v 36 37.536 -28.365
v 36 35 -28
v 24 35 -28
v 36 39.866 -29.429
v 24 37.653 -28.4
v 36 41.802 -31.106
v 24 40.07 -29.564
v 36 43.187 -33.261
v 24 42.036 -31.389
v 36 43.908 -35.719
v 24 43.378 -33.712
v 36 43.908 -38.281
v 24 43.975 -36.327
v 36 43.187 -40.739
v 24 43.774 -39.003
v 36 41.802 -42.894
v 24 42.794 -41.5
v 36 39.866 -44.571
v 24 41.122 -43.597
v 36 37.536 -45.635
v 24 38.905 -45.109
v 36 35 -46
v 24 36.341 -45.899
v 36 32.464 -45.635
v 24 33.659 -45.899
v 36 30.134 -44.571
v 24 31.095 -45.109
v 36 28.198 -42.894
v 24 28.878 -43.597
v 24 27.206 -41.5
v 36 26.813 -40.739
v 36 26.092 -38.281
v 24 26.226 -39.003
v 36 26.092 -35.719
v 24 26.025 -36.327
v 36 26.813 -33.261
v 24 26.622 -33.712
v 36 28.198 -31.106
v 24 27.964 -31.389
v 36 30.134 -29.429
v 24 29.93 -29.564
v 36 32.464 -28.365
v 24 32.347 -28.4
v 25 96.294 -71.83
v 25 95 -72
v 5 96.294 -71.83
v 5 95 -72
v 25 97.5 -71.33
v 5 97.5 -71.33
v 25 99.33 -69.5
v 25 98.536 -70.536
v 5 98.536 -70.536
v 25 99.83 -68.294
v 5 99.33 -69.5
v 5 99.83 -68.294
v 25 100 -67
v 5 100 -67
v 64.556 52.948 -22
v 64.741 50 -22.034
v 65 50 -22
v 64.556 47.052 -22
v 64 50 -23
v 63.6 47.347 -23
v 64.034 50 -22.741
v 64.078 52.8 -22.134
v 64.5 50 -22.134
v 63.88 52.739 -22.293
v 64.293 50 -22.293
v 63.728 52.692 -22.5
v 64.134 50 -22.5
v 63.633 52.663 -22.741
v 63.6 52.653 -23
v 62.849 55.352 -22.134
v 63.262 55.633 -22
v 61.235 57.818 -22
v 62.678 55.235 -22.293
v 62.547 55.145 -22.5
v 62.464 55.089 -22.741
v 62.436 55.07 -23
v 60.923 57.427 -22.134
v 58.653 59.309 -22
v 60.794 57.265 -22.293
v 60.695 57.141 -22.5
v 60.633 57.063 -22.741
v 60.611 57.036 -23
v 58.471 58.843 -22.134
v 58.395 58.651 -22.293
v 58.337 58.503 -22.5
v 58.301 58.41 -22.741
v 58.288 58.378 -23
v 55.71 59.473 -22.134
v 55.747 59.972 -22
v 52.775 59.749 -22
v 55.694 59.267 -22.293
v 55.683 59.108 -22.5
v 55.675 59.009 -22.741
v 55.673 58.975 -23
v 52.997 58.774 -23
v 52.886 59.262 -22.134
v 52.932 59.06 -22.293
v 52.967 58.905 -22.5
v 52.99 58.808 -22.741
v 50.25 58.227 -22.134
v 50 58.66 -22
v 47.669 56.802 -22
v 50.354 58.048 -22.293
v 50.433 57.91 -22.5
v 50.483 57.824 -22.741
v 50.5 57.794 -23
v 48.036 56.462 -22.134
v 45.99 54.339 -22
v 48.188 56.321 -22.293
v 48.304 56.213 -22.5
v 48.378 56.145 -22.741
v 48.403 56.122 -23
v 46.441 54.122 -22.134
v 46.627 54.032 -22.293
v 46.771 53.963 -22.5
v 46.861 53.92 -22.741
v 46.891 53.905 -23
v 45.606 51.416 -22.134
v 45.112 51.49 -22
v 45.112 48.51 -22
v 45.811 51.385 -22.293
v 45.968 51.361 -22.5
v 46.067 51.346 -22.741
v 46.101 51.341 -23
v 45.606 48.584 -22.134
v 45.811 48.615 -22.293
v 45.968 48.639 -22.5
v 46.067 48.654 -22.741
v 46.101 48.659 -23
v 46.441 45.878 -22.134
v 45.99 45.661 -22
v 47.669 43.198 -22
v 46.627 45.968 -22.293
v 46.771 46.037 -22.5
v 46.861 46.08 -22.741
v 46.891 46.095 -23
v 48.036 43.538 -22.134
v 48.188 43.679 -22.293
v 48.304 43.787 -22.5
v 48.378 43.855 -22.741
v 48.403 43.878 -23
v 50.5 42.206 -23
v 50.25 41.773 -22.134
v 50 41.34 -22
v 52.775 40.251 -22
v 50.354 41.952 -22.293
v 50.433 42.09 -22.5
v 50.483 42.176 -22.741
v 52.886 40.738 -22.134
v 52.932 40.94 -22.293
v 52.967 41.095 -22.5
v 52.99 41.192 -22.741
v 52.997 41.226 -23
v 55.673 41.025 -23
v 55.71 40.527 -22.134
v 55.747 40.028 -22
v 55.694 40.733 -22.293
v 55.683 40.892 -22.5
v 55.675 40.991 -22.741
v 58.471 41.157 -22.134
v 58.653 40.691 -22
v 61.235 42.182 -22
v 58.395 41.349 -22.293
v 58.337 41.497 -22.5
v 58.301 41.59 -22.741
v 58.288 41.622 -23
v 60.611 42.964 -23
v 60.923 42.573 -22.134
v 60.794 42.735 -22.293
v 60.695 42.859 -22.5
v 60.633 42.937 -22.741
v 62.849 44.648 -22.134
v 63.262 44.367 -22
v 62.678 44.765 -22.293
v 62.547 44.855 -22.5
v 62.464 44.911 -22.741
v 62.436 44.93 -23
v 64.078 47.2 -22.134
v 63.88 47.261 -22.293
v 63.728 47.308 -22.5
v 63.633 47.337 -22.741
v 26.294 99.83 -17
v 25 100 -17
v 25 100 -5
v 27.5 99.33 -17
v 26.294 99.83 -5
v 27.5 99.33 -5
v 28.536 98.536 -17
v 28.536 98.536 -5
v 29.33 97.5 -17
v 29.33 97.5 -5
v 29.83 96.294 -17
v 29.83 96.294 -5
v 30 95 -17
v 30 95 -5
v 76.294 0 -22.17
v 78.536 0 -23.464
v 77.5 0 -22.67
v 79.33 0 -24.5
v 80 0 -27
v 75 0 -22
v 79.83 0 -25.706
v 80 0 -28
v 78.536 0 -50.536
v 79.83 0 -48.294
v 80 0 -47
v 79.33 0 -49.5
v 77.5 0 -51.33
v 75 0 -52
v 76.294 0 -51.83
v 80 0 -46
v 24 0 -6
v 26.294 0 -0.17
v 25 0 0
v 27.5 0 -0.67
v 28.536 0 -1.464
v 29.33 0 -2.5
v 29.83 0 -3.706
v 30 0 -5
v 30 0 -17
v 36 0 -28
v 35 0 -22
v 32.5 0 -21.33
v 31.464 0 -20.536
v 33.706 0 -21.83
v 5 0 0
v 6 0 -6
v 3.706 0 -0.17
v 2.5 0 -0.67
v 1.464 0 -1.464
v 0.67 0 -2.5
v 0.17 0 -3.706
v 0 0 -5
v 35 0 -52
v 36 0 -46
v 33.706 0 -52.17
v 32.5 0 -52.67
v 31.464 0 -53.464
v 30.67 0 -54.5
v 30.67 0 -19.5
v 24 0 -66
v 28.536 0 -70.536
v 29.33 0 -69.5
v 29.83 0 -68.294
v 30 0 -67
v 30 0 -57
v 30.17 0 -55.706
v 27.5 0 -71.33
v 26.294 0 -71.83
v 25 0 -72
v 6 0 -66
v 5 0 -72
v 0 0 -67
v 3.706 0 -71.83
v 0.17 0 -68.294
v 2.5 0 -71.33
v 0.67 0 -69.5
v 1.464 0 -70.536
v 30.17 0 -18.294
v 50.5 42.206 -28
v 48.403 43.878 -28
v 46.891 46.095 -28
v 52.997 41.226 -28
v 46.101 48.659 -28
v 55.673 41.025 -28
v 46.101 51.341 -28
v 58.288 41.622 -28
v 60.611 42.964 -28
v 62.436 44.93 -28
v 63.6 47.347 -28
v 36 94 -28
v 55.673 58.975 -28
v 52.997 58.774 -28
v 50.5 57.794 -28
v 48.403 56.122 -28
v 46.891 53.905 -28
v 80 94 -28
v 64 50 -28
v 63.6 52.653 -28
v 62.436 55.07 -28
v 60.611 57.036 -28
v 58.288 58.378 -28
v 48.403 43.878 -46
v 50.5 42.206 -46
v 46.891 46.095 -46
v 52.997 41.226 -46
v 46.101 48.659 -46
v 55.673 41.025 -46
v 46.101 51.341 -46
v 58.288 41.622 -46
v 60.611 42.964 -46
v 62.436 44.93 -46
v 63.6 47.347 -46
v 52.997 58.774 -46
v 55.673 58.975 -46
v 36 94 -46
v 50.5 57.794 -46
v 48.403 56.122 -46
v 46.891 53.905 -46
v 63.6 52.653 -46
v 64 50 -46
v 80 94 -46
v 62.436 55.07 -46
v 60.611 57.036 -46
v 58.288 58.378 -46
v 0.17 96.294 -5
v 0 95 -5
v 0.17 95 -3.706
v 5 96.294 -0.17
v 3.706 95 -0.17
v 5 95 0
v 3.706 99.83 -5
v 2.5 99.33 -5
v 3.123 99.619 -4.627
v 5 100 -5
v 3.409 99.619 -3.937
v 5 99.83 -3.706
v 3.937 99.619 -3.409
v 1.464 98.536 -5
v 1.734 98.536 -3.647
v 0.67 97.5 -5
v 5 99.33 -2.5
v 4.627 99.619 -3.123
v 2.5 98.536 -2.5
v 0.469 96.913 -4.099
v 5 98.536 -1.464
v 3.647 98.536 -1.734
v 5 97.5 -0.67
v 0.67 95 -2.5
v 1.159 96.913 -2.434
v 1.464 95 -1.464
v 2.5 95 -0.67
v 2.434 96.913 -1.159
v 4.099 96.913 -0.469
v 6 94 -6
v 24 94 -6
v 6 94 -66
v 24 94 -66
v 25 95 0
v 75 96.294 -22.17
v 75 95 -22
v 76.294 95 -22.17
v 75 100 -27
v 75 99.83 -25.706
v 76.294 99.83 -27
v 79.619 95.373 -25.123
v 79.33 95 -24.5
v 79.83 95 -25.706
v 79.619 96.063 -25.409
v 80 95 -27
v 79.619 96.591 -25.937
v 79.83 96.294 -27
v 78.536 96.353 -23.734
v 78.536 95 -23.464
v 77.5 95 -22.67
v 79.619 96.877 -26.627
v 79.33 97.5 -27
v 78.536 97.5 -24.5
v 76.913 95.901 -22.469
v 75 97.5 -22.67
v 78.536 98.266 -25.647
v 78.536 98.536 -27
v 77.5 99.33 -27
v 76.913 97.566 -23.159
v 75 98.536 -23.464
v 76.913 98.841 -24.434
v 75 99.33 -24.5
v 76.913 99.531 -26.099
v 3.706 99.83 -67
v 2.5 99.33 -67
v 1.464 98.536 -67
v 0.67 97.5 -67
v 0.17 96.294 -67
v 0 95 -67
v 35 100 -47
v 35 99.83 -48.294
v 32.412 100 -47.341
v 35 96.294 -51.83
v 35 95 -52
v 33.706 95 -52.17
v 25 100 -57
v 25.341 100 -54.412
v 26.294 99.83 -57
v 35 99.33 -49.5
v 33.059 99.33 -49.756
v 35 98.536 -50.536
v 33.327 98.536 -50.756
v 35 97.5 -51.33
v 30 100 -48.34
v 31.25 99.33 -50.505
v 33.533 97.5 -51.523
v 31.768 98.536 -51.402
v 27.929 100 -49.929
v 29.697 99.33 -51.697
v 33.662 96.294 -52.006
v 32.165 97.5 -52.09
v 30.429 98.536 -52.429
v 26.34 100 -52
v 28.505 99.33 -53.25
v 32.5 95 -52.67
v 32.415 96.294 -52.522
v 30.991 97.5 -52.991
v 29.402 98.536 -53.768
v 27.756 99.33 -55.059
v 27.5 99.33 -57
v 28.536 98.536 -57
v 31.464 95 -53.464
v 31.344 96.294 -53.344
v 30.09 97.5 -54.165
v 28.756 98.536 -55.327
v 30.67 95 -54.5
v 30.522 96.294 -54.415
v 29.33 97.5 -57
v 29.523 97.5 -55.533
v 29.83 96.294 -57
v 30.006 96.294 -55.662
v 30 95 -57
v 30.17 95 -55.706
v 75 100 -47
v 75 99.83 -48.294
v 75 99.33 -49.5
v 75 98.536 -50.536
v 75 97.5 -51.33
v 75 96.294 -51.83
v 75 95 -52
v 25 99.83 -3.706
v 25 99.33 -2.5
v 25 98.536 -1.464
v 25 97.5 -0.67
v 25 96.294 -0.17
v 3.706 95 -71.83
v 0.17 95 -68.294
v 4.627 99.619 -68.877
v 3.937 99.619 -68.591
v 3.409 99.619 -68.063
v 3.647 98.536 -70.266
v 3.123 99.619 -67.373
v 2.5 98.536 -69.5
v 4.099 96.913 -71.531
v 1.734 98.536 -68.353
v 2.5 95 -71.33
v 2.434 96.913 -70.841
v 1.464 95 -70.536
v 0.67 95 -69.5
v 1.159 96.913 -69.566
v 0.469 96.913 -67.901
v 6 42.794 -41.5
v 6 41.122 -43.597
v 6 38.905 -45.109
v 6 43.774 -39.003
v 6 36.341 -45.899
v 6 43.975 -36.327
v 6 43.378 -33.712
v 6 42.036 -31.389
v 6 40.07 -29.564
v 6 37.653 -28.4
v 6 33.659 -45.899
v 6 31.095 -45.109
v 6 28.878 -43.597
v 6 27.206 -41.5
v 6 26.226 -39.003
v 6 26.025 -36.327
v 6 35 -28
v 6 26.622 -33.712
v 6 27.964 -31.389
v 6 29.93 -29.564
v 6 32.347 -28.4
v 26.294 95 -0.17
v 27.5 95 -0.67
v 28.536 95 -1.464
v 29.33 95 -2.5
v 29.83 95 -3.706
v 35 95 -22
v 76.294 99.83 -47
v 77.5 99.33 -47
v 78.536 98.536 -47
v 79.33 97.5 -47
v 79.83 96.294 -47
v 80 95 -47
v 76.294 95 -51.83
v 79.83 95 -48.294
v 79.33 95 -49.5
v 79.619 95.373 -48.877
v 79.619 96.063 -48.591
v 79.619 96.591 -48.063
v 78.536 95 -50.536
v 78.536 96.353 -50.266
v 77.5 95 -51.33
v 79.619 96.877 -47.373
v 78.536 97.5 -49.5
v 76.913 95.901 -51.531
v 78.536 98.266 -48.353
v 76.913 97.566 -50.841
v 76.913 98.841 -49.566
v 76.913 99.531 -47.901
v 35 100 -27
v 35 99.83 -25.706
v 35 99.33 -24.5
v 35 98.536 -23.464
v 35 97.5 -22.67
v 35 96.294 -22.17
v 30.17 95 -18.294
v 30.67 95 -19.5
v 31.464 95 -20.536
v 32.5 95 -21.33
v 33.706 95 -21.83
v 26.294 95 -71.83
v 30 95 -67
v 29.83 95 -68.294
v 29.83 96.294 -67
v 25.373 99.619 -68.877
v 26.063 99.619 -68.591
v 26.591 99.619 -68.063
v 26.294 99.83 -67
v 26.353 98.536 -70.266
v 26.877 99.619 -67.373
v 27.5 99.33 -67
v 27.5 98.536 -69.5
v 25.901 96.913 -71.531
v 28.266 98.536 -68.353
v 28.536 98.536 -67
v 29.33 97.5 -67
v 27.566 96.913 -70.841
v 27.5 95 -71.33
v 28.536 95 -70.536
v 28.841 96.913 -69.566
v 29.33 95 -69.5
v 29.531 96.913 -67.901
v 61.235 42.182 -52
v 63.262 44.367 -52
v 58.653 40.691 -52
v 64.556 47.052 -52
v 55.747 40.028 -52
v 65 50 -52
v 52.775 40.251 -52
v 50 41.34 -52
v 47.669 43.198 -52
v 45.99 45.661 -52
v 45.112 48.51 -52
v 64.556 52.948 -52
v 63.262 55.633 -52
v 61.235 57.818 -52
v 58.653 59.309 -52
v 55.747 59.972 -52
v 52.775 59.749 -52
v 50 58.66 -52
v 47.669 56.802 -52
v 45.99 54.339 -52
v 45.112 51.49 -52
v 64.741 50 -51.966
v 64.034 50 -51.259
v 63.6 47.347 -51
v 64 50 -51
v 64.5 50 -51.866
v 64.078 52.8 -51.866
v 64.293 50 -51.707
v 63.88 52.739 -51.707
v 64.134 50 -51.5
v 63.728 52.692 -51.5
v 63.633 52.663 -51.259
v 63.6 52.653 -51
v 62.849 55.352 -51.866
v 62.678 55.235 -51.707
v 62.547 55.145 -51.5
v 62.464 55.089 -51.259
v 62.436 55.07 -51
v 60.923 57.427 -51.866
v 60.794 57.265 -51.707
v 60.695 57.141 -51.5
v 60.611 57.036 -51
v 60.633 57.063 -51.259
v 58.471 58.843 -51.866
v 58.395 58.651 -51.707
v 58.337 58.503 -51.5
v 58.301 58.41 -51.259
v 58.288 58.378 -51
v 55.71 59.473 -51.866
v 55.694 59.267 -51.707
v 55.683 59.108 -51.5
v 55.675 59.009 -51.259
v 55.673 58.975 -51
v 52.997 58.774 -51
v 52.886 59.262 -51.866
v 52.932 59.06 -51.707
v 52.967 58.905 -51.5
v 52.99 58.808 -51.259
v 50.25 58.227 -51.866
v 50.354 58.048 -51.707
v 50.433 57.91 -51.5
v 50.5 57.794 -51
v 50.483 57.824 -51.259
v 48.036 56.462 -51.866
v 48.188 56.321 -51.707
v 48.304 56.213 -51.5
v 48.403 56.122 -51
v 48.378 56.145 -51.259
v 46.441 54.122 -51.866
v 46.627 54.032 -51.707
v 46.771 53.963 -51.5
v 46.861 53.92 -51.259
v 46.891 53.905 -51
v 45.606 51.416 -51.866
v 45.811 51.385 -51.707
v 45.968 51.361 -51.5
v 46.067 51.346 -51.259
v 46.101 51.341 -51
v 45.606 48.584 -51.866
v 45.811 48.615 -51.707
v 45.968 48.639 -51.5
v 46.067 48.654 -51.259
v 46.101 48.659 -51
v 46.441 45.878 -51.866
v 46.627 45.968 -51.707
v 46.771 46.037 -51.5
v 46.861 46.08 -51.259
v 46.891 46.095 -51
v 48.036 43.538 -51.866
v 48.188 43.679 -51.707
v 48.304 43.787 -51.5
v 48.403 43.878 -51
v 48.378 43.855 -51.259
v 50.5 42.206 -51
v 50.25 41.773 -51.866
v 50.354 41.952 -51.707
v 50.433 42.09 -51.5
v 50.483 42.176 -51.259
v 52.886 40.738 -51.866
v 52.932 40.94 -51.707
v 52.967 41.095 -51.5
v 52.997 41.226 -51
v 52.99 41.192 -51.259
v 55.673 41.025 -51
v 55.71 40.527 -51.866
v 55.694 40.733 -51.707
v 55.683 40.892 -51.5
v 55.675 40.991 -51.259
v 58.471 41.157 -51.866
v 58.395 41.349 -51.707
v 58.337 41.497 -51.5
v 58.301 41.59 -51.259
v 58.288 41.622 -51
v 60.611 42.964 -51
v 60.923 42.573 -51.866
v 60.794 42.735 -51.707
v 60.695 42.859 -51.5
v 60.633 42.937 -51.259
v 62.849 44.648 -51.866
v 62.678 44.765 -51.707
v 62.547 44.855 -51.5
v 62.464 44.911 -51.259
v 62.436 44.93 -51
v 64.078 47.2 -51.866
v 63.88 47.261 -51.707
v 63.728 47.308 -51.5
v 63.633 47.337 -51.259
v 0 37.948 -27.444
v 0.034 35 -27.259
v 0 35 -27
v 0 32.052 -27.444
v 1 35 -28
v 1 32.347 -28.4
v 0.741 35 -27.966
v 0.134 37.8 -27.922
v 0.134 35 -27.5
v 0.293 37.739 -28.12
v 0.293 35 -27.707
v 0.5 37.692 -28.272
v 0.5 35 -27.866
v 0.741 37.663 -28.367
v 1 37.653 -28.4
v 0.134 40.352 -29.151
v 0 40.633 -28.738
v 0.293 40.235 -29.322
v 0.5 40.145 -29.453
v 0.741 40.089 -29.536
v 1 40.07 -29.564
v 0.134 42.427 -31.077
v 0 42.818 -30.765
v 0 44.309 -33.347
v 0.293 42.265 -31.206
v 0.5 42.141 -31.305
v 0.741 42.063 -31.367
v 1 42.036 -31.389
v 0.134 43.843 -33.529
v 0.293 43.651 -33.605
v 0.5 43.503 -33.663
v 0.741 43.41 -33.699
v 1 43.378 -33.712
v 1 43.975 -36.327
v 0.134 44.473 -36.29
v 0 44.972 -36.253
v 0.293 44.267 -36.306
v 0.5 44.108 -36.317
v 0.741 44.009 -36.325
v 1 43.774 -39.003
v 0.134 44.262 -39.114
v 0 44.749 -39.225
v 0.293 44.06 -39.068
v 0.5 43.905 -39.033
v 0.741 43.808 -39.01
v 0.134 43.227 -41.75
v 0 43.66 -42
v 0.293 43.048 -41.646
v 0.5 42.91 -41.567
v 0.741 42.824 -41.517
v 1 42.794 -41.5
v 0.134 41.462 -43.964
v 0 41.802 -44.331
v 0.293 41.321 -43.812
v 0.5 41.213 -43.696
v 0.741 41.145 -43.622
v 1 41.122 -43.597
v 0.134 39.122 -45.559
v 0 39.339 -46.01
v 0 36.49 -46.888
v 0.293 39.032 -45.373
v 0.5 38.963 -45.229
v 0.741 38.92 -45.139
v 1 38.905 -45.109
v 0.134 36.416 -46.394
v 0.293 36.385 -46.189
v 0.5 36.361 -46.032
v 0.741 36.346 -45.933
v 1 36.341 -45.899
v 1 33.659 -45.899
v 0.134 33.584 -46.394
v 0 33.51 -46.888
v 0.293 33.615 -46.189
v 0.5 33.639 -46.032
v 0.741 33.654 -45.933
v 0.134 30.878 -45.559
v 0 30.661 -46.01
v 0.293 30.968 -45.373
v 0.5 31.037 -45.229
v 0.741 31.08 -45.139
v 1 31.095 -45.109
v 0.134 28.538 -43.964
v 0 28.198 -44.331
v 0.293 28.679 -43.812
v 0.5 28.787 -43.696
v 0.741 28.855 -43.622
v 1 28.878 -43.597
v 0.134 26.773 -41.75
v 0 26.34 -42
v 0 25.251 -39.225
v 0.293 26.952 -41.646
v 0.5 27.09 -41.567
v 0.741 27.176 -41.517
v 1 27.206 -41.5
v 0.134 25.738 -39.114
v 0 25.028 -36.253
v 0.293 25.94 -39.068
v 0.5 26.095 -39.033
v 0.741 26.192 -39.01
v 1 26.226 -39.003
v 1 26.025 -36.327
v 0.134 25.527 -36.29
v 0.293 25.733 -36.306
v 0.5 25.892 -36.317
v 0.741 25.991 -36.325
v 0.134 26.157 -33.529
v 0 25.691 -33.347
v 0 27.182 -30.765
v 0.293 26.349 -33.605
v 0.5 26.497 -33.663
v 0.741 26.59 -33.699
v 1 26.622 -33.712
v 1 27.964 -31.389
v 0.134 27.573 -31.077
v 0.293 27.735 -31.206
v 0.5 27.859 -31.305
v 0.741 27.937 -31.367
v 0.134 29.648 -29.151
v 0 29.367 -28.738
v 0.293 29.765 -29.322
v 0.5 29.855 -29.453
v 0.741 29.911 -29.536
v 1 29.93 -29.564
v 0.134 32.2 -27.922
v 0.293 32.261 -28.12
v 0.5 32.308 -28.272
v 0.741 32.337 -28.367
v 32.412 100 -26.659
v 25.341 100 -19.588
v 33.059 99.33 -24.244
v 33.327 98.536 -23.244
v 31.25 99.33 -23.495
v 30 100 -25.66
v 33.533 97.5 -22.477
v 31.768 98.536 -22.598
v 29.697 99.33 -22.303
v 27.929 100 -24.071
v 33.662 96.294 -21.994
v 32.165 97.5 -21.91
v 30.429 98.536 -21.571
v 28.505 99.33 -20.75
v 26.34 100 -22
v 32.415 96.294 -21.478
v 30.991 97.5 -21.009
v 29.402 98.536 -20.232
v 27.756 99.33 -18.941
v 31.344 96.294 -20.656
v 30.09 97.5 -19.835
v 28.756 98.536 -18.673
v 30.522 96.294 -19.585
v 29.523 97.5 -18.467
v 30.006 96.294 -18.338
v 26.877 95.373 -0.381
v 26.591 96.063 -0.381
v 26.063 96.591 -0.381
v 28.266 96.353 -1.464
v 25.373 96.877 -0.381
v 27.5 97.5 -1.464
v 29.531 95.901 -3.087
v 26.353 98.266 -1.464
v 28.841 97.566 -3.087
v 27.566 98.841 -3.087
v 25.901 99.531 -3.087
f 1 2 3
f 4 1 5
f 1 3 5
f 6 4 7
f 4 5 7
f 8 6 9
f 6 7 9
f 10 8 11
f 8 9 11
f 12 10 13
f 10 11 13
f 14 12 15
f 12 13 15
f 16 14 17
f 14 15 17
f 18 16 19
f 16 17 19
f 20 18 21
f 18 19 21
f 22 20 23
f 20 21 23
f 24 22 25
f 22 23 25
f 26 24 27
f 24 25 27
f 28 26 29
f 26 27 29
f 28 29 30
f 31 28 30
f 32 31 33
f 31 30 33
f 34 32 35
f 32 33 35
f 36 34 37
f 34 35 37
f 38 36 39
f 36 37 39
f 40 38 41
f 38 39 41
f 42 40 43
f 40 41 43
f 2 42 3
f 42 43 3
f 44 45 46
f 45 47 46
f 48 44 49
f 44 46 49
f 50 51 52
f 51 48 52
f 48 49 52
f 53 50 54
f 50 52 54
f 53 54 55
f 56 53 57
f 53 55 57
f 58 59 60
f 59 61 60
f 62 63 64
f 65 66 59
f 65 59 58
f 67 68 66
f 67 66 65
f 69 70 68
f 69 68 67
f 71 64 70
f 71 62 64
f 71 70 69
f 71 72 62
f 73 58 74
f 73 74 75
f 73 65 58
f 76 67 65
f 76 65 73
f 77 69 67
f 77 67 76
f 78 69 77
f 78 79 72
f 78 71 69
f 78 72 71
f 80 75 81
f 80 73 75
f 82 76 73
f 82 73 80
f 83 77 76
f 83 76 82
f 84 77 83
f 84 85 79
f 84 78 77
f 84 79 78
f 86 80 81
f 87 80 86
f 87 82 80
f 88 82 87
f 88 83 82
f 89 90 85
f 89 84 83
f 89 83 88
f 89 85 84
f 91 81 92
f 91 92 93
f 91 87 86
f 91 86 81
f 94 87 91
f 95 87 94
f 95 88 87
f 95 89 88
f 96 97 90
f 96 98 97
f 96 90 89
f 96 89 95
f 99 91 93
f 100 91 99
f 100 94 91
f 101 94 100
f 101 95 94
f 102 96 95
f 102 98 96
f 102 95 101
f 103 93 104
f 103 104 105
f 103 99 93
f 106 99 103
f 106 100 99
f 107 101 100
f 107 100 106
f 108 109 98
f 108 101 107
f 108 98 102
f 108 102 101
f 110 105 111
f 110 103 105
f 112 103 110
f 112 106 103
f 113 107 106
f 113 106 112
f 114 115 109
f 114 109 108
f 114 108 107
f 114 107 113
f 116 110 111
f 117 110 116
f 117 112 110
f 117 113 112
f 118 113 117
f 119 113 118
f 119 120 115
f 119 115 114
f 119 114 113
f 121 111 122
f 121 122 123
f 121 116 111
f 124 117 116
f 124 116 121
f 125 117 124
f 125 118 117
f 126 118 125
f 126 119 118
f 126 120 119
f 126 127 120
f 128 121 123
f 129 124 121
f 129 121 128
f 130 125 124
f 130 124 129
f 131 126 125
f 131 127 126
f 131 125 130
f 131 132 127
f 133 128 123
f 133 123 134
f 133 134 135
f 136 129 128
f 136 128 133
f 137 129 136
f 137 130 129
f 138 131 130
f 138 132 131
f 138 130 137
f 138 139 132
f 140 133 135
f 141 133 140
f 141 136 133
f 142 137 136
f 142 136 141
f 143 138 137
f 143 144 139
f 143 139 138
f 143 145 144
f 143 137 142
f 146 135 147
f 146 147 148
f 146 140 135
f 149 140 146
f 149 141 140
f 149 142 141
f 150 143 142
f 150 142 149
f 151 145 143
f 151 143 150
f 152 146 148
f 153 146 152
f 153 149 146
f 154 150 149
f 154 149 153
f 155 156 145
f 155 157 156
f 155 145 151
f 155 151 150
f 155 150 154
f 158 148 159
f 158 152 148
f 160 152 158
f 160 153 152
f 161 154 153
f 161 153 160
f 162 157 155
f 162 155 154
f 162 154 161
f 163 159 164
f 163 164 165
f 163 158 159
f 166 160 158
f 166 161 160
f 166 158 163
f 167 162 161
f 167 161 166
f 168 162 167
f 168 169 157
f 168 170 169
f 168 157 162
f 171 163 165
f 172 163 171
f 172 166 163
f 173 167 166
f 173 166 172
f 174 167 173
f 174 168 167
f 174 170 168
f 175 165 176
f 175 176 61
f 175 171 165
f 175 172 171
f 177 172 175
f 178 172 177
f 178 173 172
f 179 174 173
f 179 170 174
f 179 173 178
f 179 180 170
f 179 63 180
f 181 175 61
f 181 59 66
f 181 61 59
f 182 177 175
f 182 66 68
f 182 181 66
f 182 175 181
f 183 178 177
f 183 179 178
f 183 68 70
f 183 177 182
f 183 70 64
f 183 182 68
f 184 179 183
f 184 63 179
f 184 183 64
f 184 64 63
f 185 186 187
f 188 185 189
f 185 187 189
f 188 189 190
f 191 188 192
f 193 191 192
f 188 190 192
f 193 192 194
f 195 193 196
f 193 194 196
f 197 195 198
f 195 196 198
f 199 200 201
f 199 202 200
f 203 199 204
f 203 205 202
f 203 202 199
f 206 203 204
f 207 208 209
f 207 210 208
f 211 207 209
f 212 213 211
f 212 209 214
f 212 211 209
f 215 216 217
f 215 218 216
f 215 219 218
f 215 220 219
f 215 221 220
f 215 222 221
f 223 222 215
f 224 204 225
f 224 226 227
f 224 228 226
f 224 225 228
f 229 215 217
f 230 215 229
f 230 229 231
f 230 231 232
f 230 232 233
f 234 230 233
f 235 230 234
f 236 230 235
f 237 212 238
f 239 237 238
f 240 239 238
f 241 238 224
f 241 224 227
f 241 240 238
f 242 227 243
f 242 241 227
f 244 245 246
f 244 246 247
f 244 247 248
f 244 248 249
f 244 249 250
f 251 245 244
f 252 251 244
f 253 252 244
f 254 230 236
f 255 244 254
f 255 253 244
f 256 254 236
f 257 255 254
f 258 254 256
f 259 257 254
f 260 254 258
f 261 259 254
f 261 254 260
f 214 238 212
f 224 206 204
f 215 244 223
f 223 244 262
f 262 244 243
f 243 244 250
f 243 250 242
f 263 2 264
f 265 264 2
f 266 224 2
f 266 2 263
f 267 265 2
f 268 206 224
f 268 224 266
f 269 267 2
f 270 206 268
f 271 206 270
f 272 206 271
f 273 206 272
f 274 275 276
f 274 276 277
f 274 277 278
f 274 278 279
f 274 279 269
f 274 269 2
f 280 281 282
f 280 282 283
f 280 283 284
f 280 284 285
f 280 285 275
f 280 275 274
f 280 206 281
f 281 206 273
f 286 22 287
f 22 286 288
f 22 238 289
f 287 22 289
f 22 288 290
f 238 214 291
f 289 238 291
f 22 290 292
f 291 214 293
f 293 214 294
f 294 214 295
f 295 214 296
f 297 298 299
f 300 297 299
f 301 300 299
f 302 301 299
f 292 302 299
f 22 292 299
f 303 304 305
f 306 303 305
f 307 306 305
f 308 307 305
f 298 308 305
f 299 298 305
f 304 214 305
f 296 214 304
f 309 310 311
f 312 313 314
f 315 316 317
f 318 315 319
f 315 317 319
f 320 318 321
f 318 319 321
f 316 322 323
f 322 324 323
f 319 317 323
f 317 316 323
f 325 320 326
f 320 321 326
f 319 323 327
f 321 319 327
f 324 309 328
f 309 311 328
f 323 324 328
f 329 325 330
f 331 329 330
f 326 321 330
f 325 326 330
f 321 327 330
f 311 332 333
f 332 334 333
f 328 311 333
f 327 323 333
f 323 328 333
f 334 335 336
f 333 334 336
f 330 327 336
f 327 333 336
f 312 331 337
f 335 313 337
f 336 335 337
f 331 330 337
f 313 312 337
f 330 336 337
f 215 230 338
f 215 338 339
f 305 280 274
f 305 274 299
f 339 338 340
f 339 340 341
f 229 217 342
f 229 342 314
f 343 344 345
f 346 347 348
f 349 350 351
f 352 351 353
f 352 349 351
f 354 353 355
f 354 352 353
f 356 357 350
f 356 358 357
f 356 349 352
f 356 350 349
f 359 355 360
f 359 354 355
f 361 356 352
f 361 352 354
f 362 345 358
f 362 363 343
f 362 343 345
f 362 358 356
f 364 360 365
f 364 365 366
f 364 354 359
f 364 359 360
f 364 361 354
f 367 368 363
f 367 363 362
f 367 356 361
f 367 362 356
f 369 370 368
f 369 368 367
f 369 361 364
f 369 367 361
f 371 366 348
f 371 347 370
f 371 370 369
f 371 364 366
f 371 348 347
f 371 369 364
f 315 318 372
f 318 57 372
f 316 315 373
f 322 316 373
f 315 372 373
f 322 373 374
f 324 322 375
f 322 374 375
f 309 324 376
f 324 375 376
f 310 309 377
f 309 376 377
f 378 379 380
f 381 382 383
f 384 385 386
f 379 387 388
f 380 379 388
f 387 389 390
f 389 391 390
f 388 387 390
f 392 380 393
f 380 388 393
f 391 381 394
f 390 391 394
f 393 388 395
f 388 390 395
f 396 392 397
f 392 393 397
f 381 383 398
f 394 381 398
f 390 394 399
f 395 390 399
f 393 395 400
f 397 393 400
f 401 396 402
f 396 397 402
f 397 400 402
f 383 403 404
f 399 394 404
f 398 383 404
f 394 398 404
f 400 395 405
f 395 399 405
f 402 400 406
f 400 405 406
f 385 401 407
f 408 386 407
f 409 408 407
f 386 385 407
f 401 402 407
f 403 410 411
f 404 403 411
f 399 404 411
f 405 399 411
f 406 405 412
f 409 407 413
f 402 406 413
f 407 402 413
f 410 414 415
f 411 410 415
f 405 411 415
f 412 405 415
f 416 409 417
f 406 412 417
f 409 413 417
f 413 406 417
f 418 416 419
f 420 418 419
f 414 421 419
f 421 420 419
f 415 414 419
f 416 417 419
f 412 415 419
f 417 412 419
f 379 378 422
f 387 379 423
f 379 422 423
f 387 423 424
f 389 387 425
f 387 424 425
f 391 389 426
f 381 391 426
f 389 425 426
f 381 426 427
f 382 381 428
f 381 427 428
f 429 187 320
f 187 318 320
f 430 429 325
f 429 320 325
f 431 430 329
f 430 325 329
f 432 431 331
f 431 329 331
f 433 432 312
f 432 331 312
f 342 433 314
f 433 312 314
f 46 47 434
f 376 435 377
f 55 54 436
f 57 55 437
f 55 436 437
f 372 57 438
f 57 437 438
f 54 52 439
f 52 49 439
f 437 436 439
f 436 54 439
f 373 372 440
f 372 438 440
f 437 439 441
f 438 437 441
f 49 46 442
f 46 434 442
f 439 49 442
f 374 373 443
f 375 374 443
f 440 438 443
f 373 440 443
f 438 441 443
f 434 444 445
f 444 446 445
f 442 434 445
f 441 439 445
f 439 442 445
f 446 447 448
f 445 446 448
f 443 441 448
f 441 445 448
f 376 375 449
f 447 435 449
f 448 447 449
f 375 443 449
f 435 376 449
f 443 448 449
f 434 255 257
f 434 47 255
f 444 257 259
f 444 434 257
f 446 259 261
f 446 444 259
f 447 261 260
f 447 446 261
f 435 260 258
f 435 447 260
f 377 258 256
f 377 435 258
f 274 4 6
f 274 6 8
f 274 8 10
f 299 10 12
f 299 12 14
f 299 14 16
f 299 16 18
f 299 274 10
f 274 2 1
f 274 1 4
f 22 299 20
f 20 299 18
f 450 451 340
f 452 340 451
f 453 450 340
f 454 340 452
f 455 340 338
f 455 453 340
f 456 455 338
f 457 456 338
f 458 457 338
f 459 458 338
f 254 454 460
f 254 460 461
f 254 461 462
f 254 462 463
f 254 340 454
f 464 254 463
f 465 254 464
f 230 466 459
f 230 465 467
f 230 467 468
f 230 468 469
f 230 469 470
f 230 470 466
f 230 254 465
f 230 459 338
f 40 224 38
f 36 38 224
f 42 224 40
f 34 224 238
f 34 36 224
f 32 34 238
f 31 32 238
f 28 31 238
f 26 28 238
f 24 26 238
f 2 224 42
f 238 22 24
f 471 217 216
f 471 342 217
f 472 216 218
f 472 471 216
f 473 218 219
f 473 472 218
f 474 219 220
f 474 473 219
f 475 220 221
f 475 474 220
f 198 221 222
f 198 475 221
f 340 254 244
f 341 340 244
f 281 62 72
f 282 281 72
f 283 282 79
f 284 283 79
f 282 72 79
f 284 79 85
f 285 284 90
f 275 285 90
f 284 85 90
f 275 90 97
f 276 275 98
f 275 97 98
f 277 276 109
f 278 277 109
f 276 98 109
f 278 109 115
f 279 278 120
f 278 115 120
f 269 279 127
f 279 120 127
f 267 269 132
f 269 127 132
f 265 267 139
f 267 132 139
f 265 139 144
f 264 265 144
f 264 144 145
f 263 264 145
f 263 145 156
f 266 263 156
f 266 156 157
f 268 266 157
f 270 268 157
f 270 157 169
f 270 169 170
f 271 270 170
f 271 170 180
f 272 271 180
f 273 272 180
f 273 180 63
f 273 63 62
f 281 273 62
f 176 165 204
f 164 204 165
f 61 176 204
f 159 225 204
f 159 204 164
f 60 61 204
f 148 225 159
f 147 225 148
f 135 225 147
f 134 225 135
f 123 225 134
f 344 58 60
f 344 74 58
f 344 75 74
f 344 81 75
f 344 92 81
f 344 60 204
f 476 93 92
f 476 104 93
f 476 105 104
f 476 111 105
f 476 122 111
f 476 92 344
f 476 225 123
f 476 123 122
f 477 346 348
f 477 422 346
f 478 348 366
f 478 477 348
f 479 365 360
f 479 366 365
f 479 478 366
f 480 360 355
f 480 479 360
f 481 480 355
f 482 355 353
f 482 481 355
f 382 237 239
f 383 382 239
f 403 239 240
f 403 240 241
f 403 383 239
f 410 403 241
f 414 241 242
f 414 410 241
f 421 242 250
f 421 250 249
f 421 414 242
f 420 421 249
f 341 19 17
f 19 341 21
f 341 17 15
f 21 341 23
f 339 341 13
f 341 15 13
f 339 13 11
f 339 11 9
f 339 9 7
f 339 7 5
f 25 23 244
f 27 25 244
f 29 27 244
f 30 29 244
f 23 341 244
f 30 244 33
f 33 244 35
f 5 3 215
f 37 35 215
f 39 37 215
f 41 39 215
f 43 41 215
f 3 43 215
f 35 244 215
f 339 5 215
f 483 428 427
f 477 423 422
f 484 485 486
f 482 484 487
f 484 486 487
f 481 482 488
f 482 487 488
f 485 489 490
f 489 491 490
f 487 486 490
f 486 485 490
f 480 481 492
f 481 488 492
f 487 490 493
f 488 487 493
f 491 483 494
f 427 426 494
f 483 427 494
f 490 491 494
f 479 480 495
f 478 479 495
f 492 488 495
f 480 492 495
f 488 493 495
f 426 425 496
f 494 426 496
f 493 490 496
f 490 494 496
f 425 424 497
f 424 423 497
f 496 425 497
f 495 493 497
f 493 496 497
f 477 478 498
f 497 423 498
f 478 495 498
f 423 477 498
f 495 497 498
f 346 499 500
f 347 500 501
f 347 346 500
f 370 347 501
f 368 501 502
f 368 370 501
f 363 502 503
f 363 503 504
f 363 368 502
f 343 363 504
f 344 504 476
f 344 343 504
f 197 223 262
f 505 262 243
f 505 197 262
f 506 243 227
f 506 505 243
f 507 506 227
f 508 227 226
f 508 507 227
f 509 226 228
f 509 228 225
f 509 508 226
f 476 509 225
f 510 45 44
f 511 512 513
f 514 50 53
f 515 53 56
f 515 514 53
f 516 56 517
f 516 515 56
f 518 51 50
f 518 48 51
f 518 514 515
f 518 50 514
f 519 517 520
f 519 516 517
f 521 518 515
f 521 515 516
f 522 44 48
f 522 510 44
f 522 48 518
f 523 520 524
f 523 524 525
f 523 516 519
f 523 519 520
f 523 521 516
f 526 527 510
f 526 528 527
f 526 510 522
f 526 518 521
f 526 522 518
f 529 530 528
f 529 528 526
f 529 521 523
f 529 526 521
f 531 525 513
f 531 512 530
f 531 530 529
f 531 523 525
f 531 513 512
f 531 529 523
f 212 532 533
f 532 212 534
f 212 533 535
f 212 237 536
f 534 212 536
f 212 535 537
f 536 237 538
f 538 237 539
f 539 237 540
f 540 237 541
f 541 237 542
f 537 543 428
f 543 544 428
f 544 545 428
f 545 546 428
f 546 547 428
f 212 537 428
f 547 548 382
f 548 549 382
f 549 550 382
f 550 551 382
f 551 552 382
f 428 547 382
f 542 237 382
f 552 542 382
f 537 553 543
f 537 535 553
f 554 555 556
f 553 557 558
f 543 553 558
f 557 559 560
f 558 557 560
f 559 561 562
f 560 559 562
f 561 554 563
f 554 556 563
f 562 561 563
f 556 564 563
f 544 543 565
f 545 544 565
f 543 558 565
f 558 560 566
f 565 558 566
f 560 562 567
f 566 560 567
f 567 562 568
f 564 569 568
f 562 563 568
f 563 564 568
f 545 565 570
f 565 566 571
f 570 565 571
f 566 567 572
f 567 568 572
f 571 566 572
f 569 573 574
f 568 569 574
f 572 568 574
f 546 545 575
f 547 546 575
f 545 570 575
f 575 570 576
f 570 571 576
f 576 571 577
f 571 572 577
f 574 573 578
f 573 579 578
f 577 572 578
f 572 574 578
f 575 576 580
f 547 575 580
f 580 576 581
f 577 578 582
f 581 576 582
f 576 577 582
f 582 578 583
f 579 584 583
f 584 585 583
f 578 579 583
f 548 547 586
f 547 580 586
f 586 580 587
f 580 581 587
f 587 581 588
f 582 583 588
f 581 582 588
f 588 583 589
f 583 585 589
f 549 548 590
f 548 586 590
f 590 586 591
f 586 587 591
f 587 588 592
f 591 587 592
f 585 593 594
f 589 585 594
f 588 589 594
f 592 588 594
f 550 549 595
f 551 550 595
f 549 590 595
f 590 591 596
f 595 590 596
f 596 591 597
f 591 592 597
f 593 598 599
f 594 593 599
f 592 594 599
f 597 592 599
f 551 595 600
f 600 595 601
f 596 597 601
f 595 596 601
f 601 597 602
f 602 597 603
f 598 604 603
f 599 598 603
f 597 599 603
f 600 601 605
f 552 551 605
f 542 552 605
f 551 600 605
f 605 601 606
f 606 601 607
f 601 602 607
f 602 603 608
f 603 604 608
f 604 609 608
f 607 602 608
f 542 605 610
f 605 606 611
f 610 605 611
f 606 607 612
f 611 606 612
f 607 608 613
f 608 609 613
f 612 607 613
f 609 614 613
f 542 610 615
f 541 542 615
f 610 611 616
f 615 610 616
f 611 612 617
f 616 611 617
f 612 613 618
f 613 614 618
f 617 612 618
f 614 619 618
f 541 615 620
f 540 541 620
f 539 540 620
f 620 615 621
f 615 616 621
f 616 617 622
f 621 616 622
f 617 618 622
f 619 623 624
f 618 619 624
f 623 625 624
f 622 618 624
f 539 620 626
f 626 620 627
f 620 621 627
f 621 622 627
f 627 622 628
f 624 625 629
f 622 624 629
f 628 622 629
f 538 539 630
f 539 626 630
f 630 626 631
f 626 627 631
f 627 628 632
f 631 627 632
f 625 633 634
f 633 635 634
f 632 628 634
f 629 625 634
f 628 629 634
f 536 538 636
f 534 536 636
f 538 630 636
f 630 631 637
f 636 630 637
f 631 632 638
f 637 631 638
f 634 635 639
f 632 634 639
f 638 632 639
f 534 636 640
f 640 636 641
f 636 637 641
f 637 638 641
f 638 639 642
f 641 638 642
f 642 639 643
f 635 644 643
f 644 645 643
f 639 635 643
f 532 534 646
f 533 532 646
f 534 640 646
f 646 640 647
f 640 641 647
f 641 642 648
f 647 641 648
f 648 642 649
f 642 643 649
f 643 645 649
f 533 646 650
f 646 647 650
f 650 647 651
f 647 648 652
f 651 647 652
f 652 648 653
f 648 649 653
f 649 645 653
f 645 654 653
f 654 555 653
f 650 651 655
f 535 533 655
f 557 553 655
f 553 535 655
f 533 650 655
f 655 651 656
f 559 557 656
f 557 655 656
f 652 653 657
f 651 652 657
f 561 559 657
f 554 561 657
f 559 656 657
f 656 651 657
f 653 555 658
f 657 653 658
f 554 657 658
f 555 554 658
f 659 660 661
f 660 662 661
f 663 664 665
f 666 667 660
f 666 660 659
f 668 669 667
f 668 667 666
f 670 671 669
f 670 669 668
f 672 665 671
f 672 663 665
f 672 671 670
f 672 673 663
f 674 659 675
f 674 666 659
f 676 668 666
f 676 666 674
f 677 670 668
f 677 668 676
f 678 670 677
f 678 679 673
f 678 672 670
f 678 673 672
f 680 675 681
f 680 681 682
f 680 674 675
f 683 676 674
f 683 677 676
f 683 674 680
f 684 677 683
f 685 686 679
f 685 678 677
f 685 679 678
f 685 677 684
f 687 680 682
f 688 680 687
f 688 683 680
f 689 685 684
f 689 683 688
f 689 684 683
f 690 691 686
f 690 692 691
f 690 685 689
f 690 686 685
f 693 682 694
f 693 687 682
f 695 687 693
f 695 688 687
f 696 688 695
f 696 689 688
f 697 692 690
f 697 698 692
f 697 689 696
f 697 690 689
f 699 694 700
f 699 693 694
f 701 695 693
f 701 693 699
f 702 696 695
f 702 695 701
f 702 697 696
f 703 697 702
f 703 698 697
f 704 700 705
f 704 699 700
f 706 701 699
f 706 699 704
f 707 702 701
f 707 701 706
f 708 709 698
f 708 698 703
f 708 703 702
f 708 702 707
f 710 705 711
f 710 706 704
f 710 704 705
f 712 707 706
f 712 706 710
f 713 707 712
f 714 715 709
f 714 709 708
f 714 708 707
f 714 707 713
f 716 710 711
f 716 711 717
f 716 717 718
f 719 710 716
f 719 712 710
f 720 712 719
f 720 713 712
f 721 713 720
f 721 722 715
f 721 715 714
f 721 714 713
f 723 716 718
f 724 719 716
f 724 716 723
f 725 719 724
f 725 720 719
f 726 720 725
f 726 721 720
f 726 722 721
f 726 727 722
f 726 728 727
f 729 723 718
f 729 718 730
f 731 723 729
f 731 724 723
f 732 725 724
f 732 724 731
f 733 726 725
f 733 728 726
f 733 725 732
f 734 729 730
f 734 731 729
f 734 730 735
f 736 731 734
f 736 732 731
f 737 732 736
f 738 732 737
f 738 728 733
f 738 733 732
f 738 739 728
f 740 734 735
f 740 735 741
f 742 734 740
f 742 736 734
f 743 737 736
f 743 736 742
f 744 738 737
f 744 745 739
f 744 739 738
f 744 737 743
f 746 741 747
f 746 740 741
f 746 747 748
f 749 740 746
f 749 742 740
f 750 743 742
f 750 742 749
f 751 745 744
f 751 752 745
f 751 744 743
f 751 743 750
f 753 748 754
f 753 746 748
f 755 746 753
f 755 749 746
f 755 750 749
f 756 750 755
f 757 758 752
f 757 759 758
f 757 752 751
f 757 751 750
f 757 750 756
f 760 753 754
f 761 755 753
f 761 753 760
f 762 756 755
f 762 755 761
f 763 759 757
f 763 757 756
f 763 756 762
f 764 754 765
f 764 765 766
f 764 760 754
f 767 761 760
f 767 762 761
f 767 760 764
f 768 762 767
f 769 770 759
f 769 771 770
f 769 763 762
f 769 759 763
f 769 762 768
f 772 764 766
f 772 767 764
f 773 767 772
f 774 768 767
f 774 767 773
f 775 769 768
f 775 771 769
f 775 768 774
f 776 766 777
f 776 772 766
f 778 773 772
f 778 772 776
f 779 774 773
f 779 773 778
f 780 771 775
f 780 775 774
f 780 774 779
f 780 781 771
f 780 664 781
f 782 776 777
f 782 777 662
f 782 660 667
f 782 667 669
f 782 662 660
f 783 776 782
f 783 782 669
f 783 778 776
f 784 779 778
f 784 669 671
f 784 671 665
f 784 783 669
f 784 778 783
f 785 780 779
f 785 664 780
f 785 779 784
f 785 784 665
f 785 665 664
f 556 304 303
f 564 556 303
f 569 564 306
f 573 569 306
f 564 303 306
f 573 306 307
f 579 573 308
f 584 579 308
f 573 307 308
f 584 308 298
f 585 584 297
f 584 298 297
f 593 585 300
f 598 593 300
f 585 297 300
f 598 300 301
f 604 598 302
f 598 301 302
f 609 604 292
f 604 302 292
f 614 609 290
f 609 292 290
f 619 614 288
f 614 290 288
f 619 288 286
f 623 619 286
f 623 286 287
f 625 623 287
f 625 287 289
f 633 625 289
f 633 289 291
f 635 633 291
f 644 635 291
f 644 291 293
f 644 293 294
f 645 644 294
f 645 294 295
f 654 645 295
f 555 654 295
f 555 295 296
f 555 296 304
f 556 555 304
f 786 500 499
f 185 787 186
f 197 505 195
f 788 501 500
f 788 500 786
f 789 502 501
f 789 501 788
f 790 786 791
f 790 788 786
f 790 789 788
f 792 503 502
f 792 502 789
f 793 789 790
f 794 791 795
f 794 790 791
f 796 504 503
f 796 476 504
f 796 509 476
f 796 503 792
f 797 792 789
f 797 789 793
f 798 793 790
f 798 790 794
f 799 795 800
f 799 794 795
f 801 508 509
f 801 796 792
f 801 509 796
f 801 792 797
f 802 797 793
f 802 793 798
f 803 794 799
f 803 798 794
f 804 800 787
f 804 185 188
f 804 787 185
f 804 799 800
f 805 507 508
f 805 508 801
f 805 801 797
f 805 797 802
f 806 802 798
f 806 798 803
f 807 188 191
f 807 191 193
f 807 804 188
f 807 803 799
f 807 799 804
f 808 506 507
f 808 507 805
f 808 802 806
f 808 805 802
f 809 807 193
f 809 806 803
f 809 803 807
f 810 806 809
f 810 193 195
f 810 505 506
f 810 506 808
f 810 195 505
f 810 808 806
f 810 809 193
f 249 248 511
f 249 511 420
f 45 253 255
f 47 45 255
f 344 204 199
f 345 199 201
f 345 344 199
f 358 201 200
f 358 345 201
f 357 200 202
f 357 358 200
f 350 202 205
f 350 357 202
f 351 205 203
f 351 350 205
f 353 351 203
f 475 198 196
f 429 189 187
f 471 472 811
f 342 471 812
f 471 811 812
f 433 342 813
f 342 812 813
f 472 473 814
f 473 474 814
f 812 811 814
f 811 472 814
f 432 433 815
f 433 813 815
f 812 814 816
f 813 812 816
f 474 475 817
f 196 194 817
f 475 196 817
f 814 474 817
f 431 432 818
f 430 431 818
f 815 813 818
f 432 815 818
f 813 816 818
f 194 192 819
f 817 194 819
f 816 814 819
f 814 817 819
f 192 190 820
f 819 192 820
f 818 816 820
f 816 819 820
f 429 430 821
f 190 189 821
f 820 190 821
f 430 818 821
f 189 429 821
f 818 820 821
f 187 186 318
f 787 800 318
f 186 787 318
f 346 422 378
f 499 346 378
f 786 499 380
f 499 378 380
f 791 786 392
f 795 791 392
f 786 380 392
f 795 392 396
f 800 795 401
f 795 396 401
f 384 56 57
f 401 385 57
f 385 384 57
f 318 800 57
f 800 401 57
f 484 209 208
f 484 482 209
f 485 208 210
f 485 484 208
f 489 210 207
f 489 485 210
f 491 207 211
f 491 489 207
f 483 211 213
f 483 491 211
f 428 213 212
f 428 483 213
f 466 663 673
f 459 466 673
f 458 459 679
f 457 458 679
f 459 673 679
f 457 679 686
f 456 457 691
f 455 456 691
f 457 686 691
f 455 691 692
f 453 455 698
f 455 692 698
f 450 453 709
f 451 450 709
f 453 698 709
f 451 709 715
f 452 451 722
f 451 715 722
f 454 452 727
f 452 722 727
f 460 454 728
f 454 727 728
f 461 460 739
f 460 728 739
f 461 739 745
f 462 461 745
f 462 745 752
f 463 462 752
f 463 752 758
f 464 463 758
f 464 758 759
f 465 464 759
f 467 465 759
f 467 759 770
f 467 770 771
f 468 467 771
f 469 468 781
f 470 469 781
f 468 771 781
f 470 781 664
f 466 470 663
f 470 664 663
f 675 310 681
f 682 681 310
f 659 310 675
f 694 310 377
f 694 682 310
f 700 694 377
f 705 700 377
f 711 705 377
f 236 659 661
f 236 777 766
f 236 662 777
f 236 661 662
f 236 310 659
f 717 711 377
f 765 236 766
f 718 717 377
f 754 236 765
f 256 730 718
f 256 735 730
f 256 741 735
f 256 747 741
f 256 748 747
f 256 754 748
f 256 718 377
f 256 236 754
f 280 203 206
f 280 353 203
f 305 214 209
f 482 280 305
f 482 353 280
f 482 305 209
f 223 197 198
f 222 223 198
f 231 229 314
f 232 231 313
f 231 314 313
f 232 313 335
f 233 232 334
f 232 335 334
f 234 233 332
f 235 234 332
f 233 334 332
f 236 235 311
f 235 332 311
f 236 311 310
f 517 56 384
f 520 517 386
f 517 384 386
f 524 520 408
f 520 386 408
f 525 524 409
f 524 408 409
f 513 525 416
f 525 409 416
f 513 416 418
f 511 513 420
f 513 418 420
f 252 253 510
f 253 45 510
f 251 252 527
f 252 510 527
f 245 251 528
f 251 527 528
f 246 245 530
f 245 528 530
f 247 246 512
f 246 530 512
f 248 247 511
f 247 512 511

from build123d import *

# Parameters (mm, degrees)
BOSS_EXTRUDE1_DEPTH     = 100
SKETCH2_W               = 30
SKETCH2_H               = 100
BOSS_EXTRUDE3_DEPTH     = 50
SKETCH6_W               = 18
SKETCH6_H               = 94
CUT_EXTRUDE1_DEPTH      = 44
SKETCH7_W               = 18
SKETCH7_H               = 60
CUT_EXTRUDE2_DEPTH      = 94
SKETCH8_R               = 9
CUT_EXTRUDE3_DEPTH      = 1
CUT_EXTRUDE3_DEPTH_BACK = 81
FILLET1_R               = 5
SKETCH9_R               = 9
CUT_EXTRUDE4_DEPTH      = 51
FILLET2_R               = 1


with BuildPart() as part:
    # Sketch1 → Boss-Extrude1 (new body)
    with BuildSketch(Plane(origin=(0, 0, 0), x_dir=(1, 0, 0), z_dir=(0, 1, 0))):
        Polygon((24, 72), (30, 72), (30, 0), (0, 0), (0, 72), (6, 72), align=None)
    extrude(amount=BOSS_EXTRUDE1_DEPTH)

    # Sketch2 → Boss-Extrude3 (add)
    with BuildSketch(Plane(origin=(30, 0, 0), x_dir=(0, 0, -1), z_dir=(1, 0, 0))):
        with Locations((37, 50)):
            Rectangle(SKETCH2_W, SKETCH2_H)
    extrude(amount=BOSS_EXTRUDE3_DEPTH)

    # Sketch6 → Cut-Extrude1 (cut)
    with BuildSketch(Plane(origin=(80, 0, 0), x_dir=(0, 0, -1), z_dir=(1, 0, 0))):
        with Locations((37, 47)):
            Rectangle(SKETCH6_W, SKETCH6_H)
    extrude(amount=-CUT_EXTRUDE1_DEPTH, mode=Mode.SUBTRACT)

    # Sketch7 → Cut-Extrude2 (cut)
    with BuildSketch(Plane.XZ):
        with Locations((15, -36)):
            Rectangle(SKETCH7_W, SKETCH7_H)
    extrude(amount=-CUT_EXTRUDE2_DEPTH, mode=Mode.SUBTRACT)

    # Sketch8 → Cut-Extrude3 (cut, two sides)
    with BuildSketch(Plane.ZY) as cut_extrude3_sk:
        with Locations((-37, 35)):
            Circle(SKETCH8_R)
    extrude(amount=CUT_EXTRUDE3_DEPTH, mode=Mode.SUBTRACT)
    extrude(cut_extrude3_sk.sketch, amount=-CUT_EXTRUDE3_DEPTH_BACK, mode=Mode.SUBTRACT)

    # Fillet1
    fillet1_edges = [part.edges().sort_by_distance(p)[0] for p in [
        (30, 100, -11),
        (0, 50, -72),
        (30, 50, -72),
        (30, 50, 0),
        (0, 50, 0),
        (15, 100, -72),
        (30, 100, -62),
        (30, 50, -22),
        (55, 100, -22),
        (30, 50, -52),
        (55, 100, -52),
        (80, 50, -22),
        (80, 50, -52),
        (80, 100, -37),
        (0, 100, -36),
        (15, 100, 0),
    ]]
    fillet(fillet1_edges, radius=FILLET1_R)

    # Sketch9 → Cut-Extrude4 (cut, through all)
    with BuildSketch(Plane.XY.offset(-22)):
        with Locations((55, 50)):
            Circle(SKETCH9_R)
    extrude(amount=-CUT_EXTRUDE4_DEPTH, mode=Mode.SUBTRACT)

    # Fillet2
    fillet2_edges = [part.edges().sort_by_distance(p)[0] for p in [
        (46, 50, -52),
        (46, 50, -22),
        (0, 35, -46),
    ]]
    fillet(fillet2_edges, radius=FILLET2_R)


solid = part.part
